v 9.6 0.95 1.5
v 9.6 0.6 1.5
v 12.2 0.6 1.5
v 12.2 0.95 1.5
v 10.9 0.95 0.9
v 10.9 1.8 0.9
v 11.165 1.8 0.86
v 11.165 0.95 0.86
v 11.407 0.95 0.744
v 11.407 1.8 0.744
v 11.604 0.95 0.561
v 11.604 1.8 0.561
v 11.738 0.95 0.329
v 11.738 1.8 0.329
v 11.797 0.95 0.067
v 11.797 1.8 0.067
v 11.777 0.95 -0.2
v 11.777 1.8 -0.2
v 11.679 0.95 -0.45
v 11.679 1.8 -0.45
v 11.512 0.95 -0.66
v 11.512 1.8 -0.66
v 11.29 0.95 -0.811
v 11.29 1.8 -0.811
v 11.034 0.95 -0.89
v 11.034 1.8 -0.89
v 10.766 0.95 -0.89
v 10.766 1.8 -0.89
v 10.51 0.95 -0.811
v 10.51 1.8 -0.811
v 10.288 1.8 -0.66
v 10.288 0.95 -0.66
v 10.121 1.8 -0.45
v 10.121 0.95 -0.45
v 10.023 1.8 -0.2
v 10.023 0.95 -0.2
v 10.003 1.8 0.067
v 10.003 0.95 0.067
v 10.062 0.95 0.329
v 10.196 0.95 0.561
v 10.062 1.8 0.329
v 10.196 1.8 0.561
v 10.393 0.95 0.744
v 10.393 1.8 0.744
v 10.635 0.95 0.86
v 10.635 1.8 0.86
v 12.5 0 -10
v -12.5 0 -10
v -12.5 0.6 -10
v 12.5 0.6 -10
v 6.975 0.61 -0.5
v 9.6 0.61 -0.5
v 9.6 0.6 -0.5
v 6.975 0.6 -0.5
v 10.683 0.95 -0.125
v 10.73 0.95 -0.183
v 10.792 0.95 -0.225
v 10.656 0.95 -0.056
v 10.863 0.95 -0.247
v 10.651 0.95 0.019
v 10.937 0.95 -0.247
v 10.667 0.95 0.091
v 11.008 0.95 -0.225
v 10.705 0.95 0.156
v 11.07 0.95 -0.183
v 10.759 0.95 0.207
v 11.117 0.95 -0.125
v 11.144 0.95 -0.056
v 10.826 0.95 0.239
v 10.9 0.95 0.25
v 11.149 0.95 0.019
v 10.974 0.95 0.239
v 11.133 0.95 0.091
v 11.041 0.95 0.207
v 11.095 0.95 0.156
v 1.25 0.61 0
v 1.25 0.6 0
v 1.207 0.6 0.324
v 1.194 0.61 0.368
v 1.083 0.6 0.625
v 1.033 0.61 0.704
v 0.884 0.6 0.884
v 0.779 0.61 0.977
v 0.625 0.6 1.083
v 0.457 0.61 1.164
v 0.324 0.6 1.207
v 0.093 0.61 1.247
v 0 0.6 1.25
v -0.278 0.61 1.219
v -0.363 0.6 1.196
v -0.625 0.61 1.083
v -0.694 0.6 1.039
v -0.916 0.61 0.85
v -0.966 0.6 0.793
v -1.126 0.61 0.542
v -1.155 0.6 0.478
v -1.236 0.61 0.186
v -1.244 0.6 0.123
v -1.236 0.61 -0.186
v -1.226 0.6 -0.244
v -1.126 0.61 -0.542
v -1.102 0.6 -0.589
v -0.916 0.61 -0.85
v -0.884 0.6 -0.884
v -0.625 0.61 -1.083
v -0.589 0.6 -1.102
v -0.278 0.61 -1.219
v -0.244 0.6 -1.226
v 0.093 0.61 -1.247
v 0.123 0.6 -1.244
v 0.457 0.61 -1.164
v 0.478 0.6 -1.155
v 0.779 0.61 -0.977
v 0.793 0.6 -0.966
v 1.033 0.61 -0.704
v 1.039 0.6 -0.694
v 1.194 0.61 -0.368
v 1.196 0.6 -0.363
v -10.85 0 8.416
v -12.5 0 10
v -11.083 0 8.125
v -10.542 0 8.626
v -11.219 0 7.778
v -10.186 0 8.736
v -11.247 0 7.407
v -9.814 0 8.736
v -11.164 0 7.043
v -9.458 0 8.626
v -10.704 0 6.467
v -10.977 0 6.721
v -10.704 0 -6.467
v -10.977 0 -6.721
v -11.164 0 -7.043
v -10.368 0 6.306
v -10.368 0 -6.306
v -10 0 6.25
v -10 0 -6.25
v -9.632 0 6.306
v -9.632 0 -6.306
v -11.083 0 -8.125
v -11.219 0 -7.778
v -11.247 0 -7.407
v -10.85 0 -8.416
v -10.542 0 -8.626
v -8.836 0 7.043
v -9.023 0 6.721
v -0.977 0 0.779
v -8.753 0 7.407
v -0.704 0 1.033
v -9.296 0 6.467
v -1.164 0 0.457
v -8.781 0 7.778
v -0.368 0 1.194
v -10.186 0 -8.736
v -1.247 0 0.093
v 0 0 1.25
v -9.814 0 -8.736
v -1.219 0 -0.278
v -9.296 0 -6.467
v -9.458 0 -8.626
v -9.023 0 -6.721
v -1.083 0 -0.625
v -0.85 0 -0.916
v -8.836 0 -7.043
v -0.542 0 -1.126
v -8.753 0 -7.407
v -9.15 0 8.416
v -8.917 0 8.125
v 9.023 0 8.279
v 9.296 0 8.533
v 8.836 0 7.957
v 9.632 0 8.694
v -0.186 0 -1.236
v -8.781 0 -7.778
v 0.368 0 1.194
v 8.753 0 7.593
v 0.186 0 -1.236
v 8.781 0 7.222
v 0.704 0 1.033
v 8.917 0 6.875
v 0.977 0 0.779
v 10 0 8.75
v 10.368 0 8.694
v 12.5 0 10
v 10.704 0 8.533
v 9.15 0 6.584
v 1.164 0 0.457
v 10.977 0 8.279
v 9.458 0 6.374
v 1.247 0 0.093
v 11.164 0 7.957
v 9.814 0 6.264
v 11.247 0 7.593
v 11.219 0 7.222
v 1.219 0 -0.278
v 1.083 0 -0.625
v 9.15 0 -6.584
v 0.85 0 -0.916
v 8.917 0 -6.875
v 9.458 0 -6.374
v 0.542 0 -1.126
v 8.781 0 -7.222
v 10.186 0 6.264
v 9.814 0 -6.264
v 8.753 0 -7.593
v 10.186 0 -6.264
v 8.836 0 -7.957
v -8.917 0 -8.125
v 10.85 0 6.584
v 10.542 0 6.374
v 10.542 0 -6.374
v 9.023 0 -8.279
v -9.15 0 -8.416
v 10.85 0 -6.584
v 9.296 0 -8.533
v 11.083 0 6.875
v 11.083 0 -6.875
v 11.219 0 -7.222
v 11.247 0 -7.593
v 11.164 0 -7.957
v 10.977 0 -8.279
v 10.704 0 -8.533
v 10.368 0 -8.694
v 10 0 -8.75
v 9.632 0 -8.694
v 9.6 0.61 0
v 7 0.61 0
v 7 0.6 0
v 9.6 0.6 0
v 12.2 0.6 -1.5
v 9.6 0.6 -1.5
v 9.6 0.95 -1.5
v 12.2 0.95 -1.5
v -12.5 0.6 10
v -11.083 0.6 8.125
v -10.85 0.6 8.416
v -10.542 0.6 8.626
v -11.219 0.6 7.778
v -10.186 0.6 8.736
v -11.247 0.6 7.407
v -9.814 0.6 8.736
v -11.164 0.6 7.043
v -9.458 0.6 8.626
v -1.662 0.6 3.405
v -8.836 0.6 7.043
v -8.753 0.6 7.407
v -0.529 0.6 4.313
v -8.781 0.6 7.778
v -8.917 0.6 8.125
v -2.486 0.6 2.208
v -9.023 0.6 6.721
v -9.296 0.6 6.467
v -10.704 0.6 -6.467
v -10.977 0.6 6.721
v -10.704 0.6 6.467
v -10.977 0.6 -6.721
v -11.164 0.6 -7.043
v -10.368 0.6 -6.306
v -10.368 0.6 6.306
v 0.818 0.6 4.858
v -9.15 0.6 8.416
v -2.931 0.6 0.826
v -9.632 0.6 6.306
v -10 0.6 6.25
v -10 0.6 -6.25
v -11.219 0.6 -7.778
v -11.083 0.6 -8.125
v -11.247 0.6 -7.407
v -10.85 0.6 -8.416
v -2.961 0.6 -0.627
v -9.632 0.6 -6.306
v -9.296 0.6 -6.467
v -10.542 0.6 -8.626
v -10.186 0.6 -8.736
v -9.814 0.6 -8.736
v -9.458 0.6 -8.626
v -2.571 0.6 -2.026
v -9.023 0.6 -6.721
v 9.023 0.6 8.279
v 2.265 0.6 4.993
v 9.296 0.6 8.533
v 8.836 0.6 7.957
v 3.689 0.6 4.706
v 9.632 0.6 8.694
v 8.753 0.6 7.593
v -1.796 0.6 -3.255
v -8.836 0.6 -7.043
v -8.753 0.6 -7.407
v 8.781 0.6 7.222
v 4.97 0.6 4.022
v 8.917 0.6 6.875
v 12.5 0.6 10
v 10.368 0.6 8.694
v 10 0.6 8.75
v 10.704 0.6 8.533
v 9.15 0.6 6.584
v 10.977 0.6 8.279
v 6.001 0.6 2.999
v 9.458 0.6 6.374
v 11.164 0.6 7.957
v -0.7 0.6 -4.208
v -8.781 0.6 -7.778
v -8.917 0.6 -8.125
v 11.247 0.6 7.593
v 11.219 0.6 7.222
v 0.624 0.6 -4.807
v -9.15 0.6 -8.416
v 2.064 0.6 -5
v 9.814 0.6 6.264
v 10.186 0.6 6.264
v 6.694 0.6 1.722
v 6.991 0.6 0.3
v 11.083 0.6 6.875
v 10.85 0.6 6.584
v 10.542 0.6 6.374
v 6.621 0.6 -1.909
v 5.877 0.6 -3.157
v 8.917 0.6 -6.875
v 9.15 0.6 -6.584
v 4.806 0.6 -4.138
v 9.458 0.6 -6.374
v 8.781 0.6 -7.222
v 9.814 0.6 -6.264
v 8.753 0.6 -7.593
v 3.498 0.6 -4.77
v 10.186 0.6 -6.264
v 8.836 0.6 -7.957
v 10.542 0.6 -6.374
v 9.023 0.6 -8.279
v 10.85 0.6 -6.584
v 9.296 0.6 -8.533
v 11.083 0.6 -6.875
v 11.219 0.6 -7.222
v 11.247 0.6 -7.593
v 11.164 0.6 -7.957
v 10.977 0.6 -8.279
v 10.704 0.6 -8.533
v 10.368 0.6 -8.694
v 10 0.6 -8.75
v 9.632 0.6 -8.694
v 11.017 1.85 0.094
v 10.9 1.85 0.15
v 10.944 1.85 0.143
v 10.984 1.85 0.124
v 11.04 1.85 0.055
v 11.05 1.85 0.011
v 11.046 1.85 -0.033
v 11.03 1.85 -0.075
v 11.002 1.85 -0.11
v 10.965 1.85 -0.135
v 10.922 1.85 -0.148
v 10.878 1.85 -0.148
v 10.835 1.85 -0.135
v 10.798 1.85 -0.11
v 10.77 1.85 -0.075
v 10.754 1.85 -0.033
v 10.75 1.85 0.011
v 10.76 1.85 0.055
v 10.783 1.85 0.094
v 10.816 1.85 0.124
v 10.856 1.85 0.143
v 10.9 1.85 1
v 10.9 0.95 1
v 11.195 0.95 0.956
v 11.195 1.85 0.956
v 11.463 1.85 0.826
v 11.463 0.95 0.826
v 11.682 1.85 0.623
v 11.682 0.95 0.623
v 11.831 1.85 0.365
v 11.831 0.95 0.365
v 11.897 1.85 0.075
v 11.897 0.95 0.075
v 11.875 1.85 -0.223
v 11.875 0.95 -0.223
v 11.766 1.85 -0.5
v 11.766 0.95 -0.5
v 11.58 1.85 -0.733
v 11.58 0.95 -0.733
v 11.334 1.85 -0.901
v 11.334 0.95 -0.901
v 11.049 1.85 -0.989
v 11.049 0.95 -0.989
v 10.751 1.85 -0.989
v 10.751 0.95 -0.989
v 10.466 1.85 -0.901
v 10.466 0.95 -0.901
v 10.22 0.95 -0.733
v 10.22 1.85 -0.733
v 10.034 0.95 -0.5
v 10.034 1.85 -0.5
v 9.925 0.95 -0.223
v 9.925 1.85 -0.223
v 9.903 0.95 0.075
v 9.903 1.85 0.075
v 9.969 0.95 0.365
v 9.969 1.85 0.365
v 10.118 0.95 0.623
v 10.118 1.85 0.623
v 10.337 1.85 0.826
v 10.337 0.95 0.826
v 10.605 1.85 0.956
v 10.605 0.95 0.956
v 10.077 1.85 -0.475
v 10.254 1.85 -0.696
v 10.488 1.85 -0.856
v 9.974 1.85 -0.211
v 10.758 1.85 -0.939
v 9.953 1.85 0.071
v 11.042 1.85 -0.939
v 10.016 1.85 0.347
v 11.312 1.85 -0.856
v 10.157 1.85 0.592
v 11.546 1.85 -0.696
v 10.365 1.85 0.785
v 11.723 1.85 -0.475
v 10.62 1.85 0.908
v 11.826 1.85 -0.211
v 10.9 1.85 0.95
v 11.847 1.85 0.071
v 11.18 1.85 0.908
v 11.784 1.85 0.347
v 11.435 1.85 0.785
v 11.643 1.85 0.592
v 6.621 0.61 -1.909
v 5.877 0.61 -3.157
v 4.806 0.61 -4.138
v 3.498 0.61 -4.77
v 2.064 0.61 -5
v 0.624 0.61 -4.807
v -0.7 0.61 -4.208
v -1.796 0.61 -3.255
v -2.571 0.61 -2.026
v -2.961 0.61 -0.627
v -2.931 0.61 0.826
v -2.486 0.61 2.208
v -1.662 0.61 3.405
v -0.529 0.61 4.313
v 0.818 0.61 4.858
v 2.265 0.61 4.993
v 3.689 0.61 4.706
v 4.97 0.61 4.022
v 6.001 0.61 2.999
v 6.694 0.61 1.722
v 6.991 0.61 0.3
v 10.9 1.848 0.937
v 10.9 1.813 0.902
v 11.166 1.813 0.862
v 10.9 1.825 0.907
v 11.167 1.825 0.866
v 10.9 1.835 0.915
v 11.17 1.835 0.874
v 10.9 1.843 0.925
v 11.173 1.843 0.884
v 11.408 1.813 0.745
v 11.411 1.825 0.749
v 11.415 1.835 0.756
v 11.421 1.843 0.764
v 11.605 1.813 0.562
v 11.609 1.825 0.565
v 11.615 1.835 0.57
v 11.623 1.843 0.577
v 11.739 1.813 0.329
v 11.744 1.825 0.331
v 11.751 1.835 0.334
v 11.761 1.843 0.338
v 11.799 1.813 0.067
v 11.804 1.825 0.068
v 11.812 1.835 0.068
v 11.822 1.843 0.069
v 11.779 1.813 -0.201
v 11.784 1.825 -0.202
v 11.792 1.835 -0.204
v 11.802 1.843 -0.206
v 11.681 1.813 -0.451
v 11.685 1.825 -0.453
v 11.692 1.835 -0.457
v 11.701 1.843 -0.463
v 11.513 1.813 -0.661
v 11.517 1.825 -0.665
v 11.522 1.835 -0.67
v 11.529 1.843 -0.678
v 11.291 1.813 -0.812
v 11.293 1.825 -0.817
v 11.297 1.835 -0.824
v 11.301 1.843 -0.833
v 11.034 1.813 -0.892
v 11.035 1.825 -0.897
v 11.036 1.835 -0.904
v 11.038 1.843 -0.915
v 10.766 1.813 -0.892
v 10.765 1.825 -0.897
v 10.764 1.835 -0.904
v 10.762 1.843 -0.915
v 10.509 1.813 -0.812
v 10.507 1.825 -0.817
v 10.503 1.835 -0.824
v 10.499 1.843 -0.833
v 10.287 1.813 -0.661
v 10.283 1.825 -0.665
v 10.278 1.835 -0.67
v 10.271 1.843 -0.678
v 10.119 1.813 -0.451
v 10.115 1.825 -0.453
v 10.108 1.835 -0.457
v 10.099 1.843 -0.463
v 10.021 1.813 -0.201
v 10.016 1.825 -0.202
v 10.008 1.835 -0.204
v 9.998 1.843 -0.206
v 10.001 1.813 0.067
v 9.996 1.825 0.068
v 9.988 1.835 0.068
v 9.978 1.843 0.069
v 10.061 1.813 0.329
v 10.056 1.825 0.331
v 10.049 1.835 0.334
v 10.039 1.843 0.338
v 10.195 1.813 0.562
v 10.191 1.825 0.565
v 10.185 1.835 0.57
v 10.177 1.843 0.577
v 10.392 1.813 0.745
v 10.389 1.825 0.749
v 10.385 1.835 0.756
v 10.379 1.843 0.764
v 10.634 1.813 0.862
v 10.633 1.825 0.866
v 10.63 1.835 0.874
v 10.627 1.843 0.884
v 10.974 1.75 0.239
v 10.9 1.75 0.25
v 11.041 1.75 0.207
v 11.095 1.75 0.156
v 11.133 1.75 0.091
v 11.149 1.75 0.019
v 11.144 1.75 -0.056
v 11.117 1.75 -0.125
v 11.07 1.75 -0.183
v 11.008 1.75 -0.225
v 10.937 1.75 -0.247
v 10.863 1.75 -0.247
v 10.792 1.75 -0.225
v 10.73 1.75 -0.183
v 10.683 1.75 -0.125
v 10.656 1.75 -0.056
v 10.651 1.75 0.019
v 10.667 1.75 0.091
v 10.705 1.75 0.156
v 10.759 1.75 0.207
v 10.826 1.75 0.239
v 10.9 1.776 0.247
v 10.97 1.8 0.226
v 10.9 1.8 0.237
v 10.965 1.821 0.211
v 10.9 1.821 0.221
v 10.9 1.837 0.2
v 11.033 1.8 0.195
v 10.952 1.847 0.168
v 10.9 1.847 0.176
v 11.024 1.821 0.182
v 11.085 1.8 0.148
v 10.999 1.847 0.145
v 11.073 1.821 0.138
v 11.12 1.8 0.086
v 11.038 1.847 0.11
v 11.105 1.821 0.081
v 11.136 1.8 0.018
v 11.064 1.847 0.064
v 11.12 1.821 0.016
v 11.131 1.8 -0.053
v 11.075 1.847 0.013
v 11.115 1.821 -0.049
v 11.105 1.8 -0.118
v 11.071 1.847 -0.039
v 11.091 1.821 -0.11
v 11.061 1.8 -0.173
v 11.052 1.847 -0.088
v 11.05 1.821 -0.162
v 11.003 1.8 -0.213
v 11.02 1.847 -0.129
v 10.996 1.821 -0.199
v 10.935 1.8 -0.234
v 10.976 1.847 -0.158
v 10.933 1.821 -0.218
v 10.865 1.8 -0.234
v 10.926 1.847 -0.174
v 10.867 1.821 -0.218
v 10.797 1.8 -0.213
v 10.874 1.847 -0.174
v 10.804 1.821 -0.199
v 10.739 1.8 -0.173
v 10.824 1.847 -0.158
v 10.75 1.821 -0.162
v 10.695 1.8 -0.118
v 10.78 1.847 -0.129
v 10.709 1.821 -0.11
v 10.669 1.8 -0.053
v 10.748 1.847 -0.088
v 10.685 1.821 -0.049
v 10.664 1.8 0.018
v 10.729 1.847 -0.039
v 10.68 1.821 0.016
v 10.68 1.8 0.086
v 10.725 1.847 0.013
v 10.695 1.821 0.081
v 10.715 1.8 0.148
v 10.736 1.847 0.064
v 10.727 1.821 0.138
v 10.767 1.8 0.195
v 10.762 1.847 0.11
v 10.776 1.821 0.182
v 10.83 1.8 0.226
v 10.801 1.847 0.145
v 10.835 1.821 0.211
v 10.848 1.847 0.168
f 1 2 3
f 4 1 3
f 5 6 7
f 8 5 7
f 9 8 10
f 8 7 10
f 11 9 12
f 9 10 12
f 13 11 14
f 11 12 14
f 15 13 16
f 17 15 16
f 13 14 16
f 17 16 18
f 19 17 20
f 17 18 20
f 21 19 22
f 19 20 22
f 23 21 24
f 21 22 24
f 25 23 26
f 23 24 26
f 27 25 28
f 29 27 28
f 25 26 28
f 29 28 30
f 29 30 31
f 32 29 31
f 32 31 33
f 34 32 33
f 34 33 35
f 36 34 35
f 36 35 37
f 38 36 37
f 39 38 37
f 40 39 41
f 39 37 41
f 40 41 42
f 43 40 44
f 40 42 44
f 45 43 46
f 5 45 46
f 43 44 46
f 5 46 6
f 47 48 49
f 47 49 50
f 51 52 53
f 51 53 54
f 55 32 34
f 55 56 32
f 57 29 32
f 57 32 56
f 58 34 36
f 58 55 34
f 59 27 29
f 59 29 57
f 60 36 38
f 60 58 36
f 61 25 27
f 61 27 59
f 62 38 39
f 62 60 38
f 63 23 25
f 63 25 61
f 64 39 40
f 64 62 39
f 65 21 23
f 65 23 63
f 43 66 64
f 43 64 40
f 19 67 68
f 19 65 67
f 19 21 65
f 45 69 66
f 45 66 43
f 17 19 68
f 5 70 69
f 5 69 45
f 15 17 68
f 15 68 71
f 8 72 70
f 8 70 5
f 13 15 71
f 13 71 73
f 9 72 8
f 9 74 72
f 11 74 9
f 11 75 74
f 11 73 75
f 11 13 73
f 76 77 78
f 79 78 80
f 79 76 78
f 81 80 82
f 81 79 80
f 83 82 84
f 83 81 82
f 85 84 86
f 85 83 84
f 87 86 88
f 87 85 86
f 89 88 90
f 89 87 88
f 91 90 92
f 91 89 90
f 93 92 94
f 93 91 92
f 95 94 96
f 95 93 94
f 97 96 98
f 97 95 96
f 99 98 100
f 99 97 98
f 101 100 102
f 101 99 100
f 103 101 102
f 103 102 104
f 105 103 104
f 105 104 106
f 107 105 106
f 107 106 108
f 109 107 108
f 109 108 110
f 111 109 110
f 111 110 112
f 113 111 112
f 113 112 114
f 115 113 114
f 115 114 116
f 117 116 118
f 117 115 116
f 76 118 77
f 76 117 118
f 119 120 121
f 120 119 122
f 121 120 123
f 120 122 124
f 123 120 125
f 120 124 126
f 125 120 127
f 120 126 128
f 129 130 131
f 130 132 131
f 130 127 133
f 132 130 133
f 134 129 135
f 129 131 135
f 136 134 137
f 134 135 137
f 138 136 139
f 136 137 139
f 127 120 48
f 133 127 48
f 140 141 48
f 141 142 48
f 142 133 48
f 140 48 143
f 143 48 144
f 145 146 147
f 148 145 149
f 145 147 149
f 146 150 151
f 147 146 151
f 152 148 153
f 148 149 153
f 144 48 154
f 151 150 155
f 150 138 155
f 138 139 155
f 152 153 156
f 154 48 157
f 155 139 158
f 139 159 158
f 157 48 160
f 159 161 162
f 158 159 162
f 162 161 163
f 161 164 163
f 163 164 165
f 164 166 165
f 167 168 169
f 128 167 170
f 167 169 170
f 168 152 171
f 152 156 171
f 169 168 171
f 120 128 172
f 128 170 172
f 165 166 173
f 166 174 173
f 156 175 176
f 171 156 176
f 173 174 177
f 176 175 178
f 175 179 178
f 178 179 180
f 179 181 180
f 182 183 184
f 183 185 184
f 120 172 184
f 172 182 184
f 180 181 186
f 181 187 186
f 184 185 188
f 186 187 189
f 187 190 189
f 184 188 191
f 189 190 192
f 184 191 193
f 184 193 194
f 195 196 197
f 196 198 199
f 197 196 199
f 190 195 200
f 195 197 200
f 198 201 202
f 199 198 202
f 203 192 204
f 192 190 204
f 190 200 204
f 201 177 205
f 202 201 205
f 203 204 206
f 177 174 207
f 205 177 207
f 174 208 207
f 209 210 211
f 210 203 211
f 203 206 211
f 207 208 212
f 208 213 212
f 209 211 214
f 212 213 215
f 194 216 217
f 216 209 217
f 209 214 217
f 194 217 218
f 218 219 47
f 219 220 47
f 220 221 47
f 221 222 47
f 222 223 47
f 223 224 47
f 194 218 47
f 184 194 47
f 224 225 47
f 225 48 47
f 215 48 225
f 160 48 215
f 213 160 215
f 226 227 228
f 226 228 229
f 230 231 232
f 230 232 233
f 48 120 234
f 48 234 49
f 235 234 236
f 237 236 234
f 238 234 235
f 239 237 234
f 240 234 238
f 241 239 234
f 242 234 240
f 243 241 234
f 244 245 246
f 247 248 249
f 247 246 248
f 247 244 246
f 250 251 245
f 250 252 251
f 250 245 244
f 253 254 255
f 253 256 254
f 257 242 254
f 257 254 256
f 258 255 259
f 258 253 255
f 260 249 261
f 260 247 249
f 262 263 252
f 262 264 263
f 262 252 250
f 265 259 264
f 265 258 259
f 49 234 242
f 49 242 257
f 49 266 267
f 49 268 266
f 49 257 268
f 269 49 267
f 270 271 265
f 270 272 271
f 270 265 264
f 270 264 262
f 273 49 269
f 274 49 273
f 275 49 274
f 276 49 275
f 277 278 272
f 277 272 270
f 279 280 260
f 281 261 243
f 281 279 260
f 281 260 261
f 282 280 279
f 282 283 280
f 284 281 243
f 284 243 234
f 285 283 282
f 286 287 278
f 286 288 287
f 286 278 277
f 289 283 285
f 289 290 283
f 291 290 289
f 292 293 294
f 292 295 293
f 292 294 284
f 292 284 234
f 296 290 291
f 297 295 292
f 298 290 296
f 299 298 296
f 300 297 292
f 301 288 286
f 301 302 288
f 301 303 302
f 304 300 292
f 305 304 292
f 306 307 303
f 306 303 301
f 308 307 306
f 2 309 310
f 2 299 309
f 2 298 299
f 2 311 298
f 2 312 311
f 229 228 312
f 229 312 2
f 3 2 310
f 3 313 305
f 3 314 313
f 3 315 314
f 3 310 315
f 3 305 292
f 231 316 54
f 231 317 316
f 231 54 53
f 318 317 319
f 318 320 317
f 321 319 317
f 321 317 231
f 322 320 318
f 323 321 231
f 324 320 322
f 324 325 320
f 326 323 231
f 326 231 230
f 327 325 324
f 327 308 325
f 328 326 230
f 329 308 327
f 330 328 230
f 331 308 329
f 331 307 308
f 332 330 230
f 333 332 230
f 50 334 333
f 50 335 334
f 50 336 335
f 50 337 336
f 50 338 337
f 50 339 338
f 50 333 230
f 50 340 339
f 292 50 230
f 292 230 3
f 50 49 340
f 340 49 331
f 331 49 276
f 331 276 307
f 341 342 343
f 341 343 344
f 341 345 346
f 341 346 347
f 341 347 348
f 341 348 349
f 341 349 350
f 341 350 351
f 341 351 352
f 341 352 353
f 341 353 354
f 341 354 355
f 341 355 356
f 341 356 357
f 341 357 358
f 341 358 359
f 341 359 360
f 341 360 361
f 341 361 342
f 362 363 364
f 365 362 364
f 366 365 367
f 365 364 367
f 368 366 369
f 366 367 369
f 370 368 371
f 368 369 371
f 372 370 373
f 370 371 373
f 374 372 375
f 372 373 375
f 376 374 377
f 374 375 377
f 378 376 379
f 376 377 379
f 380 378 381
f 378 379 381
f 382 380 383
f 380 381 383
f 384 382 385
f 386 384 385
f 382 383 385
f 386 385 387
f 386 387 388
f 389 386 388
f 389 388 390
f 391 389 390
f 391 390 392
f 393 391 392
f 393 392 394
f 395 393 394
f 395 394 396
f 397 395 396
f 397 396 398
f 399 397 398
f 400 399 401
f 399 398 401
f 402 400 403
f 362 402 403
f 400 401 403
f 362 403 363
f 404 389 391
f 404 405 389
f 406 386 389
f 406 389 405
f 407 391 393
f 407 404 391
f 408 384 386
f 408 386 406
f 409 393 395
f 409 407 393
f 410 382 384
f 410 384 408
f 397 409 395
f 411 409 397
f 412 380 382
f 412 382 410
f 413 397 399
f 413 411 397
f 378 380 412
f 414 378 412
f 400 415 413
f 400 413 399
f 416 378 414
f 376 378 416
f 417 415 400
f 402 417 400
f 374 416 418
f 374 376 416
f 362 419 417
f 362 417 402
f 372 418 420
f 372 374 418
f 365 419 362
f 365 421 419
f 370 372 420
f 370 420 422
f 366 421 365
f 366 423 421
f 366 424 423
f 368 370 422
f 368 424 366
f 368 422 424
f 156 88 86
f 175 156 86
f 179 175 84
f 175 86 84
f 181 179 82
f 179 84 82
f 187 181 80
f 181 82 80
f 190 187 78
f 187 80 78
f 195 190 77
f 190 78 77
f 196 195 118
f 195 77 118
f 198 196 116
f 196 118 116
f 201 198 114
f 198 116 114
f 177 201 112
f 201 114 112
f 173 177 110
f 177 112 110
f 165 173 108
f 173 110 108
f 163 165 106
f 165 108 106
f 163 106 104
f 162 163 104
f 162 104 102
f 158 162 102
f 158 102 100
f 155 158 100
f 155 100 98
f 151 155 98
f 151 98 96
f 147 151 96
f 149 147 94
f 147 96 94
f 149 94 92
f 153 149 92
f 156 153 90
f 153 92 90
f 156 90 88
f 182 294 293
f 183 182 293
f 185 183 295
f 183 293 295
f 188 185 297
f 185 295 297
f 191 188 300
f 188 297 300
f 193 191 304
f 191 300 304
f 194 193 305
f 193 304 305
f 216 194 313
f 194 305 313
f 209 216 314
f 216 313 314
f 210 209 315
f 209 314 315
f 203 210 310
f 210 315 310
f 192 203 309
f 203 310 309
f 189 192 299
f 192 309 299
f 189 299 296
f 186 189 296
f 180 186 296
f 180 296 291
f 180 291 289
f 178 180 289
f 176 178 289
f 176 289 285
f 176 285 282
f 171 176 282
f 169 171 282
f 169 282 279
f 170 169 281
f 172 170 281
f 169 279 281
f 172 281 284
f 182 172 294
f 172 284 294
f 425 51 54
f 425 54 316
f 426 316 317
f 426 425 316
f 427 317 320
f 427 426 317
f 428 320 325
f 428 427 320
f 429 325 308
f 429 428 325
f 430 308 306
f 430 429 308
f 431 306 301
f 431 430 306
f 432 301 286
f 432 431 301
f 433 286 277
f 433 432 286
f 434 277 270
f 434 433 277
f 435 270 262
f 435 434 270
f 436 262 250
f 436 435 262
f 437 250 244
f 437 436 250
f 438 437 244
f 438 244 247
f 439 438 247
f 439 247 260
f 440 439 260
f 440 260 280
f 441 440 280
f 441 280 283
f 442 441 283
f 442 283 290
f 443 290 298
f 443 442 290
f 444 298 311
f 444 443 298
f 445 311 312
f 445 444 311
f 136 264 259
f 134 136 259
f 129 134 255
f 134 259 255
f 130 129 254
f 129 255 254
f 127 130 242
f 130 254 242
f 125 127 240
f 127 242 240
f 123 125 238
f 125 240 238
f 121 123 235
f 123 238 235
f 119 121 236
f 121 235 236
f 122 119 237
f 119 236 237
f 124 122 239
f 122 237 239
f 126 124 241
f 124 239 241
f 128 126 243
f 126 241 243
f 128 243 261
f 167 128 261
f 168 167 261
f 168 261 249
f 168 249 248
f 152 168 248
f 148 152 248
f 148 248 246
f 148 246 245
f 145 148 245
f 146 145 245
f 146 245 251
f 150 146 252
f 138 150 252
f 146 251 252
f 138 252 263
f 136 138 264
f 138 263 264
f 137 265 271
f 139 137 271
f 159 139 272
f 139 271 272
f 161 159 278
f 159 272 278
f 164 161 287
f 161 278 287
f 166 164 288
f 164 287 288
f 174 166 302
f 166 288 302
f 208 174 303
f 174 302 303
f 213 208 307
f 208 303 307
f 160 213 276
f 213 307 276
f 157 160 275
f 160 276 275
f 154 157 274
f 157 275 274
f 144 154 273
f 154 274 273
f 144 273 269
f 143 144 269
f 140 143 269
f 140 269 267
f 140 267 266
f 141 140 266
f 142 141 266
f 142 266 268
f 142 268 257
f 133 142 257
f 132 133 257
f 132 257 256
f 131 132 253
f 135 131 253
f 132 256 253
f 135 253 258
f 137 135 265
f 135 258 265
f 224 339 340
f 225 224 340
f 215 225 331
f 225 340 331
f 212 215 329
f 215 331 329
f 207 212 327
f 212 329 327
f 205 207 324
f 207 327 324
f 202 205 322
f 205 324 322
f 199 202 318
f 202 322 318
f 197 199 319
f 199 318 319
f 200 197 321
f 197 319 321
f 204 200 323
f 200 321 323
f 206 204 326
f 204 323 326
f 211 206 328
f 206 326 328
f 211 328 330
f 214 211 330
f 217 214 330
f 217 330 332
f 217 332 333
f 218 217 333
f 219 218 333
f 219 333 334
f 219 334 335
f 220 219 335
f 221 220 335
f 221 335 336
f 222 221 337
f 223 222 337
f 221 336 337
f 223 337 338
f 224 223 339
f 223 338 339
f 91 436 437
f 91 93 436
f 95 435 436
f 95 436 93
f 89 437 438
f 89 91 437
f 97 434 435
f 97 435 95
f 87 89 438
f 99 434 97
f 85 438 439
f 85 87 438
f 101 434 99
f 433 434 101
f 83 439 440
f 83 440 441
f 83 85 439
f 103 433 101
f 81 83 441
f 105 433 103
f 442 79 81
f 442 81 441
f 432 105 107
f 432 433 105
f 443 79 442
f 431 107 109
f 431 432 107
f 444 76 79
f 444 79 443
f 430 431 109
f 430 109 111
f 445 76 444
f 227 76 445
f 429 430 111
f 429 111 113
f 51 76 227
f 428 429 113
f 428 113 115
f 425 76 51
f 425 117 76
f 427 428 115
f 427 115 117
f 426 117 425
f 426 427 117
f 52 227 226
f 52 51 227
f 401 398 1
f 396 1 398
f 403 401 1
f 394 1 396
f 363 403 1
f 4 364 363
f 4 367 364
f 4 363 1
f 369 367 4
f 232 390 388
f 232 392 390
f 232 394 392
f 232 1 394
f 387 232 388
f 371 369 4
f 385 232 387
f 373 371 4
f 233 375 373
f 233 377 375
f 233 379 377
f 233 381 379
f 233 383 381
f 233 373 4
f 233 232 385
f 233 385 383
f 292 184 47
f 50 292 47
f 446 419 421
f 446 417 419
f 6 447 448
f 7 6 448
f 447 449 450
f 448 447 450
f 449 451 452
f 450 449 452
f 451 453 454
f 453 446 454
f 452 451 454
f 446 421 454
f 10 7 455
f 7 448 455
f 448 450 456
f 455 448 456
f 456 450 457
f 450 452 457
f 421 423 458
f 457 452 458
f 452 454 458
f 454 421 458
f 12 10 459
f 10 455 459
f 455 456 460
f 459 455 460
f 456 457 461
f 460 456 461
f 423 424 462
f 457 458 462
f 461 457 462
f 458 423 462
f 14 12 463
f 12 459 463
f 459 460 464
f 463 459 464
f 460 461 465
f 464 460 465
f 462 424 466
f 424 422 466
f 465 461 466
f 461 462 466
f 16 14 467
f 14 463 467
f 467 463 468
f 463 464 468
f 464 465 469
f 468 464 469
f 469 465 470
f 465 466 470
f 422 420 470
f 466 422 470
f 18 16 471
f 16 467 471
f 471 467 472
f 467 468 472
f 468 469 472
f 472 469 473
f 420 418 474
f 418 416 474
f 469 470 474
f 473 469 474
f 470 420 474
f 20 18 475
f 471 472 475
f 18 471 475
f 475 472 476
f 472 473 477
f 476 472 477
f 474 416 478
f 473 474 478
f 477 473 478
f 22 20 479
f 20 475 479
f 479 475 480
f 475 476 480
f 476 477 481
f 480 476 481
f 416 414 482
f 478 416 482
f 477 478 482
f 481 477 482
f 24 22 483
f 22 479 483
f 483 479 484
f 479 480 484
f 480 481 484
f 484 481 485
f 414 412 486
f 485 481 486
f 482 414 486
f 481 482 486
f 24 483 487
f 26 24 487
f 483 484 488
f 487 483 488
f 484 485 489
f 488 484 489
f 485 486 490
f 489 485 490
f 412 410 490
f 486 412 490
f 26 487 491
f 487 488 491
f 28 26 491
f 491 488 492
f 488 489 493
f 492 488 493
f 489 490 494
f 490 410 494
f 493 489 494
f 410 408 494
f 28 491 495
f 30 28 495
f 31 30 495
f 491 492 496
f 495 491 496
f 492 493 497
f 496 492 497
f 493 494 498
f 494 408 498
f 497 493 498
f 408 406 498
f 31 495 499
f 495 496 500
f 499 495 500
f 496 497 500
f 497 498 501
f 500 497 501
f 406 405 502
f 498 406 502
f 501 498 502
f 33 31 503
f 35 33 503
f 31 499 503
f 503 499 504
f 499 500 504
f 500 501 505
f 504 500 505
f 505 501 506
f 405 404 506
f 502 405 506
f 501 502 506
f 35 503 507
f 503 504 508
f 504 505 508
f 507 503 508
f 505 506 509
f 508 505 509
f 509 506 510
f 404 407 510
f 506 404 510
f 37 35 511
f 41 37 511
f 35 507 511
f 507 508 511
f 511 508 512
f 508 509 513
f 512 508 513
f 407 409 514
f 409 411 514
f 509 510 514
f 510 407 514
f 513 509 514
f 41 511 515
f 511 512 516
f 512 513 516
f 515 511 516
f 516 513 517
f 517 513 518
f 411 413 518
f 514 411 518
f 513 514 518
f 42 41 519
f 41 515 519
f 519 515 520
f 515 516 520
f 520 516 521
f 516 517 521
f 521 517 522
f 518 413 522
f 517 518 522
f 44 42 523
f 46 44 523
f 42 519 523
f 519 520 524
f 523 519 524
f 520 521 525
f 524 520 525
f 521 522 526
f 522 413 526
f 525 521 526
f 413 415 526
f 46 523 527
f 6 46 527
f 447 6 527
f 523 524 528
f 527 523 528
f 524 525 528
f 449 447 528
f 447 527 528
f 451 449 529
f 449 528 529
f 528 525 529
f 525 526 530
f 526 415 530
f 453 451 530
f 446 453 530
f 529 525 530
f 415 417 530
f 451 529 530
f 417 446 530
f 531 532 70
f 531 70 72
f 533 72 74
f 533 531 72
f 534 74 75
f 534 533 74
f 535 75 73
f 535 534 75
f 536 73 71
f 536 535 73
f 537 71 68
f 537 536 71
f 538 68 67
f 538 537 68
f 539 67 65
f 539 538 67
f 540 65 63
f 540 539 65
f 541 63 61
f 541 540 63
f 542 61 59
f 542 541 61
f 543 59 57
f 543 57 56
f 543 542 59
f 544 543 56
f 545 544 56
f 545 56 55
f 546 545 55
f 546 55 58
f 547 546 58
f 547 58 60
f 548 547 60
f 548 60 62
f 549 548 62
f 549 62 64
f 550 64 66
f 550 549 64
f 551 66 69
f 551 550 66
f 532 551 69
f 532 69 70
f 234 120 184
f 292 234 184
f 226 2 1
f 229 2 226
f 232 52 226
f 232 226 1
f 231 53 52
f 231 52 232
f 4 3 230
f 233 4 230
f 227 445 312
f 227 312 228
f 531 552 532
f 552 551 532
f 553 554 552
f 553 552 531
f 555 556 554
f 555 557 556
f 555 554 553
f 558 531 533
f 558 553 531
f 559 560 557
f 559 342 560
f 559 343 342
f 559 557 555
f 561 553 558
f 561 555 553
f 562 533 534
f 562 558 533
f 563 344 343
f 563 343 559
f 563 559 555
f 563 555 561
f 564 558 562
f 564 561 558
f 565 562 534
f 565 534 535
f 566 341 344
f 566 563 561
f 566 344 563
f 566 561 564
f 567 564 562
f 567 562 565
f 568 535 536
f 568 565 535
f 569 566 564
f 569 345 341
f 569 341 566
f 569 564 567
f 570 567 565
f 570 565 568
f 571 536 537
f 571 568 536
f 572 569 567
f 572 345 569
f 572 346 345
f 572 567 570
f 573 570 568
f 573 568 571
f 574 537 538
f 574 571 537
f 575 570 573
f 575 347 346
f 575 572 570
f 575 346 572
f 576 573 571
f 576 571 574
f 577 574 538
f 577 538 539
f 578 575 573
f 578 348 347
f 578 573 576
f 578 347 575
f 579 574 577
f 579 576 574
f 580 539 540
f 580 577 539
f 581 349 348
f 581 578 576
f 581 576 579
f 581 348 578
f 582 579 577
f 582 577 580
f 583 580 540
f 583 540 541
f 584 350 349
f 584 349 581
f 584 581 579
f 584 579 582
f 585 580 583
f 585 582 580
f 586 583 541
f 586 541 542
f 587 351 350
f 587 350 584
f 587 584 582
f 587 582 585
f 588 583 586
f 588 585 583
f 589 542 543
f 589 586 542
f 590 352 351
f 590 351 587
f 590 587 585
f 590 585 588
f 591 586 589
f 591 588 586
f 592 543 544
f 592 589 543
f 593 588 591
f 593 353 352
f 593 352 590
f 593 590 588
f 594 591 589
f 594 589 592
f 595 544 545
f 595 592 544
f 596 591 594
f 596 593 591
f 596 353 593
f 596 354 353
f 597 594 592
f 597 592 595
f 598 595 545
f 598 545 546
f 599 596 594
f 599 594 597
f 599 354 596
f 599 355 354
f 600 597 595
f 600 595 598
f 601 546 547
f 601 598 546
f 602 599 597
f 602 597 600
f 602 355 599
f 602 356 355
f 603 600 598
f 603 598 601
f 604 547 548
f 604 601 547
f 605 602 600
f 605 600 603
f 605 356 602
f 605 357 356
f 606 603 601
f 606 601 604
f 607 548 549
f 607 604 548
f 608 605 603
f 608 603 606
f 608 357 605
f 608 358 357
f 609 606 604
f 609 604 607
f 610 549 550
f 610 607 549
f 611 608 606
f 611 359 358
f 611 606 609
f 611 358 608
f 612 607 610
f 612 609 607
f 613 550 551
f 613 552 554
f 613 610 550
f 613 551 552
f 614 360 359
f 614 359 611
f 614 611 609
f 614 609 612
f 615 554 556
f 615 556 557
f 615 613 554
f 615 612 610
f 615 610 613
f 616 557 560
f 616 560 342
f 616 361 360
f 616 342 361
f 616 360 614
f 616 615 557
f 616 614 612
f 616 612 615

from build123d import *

# Parameters (mm, degrees)
SKETCH1_W           = 25
SKETCH1_H           = 20
BOSS_EXTRUDE1_DEPTH = 0.6
SKETCH2_R           = 1.25
CUT_EXTRUDE1_DEPTH  = 0.6
SKETCH4_W           = 2.6
SKETCH4_H           = 3
BOSS_EXTRUDE2_DEPTH = 0.35
SKETCH5_R           = 1
BOSS_EXTRUDE3_DEPTH = 0.9
SKETCH6_R           = 0.9
SKETCH6_R_2         = 0.25
CUT_EXTRUDE2_DEPTH  = 0.9
FILLET1_R           = 0.1
FILLET2_R           = 0.05
BOSS_EXTRUDE9_START = 0.01
SKETCH8_R           = 1.25
BOSS_EXTRUDE9_DEPTH = 0.01


with BuildPart() as part:
    # Sketch1 → Boss-Extrude1 (new body)
    with BuildSketch(Plane(origin=(0, 0, 0), x_dir=(1, 0, 0), z_dir=(0, 1, 0))):
        Rectangle(SKETCH1_W, SKETCH1_H)
    extrude(amount=BOSS_EXTRUDE1_DEPTH)

    # Sketch2 → Cut-Extrude1 (cut)
    with BuildSketch(Plane(origin=(0, 0.6, 0), x_dir=(1, 0, 0), z_dir=(0, 1, 0))):
        with Locations(Location((-10, 7.5, 0), (0, 0, 270))):
            Circle(SKETCH2_R)
        with Locations(Location((10, 7.5, 0), (0, 0, 90))):
            Circle(SKETCH2_R)
        with Locations(Location((10, -7.5, 0), (0, 0, 270))):
            Circle(SKETCH2_R)
        with Locations(Location((-10, -7.5, 0), (0, 0, 90))):
            Circle(SKETCH2_R)
        with Locations(Location((0, 0, 0), (0, 0, 270))):
            Circle(SKETCH2_R)
    extrude(amount=-CUT_EXTRUDE1_DEPTH, mode=Mode.SUBTRACT)

    # Sketch4 → Boss-Extrude2 (add)
    with BuildSketch(Plane(origin=(0, 0.6, 0), x_dir=(1, 0, 0), z_dir=(0, 1, 0))):
        with Locations((10.9, 0)):
            Rectangle(SKETCH4_W, SKETCH4_H)
    extrude(amount=BOSS_EXTRUDE2_DEPTH)

    # Sketch5 → Boss-Extrude3 (add)
    with BuildSketch(Plane(origin=(0, 0.95, 0), x_dir=(1, 0, 0), z_dir=(0, 1, 0))):
        with Locations(Location((10.9, 0, 0), (0, 0, 270))):
            Circle(SKETCH5_R)
    extrude(amount=BOSS_EXTRUDE3_DEPTH)

    # Sketch6 → Cut-Extrude2 (cut)
    with BuildSketch(Plane(origin=(0, 1.85, 0), x_dir=(1, 0, 0), z_dir=(0, 1, 0))):
        with Locations(Location((10.9, 0, 0), (0, 0, 270))):
            Circle(SKETCH6_R)
        with Locations(Location((10.9, 0, 0), (0, 0, 270))):
            Circle(SKETCH6_R_2, mode=Mode.SUBTRACT)
    extrude(amount=-CUT_EXTRUDE2_DEPTH, mode=Mode.SUBTRACT)

    # Fillet1
    fillet1_edges = [part.edges().sort_by_distance(p)[0] for p in [
        (10.9, 1.85, -0.25),
    ]]
    fillet(fillet1_edges, radius=FILLET1_R)

    # Fillet2
    fillet2_edges = [part.edges().sort_by_distance(p)[0] for p in [
        (10.9, 1.85, -0.9),
    ]]
    fillet(fillet2_edges, radius=FILLET2_R)

    # Sketch8 → Boss-Extrude9 (add)
    # profile 1 of 3: a face of its own
    with BuildSketch(Plane(origin=(0, 0.6, 0), x_dir=(1, 0, 0), z_dir=(0, 1, 0)).offset(BOSS_EXTRUDE9_START)):
        with BuildLine():
            Line((6.991, -0.29986497), (7, 0))
            Line((7, 0), (1.25, 0))
            Line((1.25, 0), (1.25, 0.5))
            Line((1.25, 0.5), (6.974937186, 0.5))
            ThreePointArc((6.974937186, 0.5), (-2.998992097, -0.100389298), (6.991, -0.29986497))
        make_face()
        with Locations(Location((0, 0, 0), (0, 0, 270))):
            Circle(SKETCH8_R, mode=Mode.SUBTRACT)
    # profile 2 of 3: a face of its own
    with BuildSketch(Plane(origin=(0, 0.6, 0), x_dir=(1, 0, 0), z_dir=(0, 1, 0)).offset(BOSS_EXTRUDE9_START)):
        with BuildLine():
            Line((1.25, 0), (7, 0))
            ThreePointArc((7, 0), (6.993730366, 0.250313875), (6.974937186, 0.5))
            Line((6.974937186, 0.5), (1.25, 0.5))
            Line((1.25, 0.5), (1.25, 0))
        make_face()
    # profile 3 of 3: a face of its own
    with BuildSketch(Plane(origin=(0, 0.6, 0), x_dir=(1, 0, 0), z_dir=(0, 1, 0)).offset(BOSS_EXTRUDE9_START)):
        with BuildLine():
            ThreePointArc((6.974937186, 0.5), (6.993730366, 0.250313875), (7, 0))
            Line((7, 0), (9.6, 0))
            Line((9.6, 0), (9.6, 0.5))
            Line((9.6, 0.5), (6.974937186, 0.5))
        make_face()
    extrude(amount=-BOSS_EXTRUDE9_DEPTH)


solid = part.part
